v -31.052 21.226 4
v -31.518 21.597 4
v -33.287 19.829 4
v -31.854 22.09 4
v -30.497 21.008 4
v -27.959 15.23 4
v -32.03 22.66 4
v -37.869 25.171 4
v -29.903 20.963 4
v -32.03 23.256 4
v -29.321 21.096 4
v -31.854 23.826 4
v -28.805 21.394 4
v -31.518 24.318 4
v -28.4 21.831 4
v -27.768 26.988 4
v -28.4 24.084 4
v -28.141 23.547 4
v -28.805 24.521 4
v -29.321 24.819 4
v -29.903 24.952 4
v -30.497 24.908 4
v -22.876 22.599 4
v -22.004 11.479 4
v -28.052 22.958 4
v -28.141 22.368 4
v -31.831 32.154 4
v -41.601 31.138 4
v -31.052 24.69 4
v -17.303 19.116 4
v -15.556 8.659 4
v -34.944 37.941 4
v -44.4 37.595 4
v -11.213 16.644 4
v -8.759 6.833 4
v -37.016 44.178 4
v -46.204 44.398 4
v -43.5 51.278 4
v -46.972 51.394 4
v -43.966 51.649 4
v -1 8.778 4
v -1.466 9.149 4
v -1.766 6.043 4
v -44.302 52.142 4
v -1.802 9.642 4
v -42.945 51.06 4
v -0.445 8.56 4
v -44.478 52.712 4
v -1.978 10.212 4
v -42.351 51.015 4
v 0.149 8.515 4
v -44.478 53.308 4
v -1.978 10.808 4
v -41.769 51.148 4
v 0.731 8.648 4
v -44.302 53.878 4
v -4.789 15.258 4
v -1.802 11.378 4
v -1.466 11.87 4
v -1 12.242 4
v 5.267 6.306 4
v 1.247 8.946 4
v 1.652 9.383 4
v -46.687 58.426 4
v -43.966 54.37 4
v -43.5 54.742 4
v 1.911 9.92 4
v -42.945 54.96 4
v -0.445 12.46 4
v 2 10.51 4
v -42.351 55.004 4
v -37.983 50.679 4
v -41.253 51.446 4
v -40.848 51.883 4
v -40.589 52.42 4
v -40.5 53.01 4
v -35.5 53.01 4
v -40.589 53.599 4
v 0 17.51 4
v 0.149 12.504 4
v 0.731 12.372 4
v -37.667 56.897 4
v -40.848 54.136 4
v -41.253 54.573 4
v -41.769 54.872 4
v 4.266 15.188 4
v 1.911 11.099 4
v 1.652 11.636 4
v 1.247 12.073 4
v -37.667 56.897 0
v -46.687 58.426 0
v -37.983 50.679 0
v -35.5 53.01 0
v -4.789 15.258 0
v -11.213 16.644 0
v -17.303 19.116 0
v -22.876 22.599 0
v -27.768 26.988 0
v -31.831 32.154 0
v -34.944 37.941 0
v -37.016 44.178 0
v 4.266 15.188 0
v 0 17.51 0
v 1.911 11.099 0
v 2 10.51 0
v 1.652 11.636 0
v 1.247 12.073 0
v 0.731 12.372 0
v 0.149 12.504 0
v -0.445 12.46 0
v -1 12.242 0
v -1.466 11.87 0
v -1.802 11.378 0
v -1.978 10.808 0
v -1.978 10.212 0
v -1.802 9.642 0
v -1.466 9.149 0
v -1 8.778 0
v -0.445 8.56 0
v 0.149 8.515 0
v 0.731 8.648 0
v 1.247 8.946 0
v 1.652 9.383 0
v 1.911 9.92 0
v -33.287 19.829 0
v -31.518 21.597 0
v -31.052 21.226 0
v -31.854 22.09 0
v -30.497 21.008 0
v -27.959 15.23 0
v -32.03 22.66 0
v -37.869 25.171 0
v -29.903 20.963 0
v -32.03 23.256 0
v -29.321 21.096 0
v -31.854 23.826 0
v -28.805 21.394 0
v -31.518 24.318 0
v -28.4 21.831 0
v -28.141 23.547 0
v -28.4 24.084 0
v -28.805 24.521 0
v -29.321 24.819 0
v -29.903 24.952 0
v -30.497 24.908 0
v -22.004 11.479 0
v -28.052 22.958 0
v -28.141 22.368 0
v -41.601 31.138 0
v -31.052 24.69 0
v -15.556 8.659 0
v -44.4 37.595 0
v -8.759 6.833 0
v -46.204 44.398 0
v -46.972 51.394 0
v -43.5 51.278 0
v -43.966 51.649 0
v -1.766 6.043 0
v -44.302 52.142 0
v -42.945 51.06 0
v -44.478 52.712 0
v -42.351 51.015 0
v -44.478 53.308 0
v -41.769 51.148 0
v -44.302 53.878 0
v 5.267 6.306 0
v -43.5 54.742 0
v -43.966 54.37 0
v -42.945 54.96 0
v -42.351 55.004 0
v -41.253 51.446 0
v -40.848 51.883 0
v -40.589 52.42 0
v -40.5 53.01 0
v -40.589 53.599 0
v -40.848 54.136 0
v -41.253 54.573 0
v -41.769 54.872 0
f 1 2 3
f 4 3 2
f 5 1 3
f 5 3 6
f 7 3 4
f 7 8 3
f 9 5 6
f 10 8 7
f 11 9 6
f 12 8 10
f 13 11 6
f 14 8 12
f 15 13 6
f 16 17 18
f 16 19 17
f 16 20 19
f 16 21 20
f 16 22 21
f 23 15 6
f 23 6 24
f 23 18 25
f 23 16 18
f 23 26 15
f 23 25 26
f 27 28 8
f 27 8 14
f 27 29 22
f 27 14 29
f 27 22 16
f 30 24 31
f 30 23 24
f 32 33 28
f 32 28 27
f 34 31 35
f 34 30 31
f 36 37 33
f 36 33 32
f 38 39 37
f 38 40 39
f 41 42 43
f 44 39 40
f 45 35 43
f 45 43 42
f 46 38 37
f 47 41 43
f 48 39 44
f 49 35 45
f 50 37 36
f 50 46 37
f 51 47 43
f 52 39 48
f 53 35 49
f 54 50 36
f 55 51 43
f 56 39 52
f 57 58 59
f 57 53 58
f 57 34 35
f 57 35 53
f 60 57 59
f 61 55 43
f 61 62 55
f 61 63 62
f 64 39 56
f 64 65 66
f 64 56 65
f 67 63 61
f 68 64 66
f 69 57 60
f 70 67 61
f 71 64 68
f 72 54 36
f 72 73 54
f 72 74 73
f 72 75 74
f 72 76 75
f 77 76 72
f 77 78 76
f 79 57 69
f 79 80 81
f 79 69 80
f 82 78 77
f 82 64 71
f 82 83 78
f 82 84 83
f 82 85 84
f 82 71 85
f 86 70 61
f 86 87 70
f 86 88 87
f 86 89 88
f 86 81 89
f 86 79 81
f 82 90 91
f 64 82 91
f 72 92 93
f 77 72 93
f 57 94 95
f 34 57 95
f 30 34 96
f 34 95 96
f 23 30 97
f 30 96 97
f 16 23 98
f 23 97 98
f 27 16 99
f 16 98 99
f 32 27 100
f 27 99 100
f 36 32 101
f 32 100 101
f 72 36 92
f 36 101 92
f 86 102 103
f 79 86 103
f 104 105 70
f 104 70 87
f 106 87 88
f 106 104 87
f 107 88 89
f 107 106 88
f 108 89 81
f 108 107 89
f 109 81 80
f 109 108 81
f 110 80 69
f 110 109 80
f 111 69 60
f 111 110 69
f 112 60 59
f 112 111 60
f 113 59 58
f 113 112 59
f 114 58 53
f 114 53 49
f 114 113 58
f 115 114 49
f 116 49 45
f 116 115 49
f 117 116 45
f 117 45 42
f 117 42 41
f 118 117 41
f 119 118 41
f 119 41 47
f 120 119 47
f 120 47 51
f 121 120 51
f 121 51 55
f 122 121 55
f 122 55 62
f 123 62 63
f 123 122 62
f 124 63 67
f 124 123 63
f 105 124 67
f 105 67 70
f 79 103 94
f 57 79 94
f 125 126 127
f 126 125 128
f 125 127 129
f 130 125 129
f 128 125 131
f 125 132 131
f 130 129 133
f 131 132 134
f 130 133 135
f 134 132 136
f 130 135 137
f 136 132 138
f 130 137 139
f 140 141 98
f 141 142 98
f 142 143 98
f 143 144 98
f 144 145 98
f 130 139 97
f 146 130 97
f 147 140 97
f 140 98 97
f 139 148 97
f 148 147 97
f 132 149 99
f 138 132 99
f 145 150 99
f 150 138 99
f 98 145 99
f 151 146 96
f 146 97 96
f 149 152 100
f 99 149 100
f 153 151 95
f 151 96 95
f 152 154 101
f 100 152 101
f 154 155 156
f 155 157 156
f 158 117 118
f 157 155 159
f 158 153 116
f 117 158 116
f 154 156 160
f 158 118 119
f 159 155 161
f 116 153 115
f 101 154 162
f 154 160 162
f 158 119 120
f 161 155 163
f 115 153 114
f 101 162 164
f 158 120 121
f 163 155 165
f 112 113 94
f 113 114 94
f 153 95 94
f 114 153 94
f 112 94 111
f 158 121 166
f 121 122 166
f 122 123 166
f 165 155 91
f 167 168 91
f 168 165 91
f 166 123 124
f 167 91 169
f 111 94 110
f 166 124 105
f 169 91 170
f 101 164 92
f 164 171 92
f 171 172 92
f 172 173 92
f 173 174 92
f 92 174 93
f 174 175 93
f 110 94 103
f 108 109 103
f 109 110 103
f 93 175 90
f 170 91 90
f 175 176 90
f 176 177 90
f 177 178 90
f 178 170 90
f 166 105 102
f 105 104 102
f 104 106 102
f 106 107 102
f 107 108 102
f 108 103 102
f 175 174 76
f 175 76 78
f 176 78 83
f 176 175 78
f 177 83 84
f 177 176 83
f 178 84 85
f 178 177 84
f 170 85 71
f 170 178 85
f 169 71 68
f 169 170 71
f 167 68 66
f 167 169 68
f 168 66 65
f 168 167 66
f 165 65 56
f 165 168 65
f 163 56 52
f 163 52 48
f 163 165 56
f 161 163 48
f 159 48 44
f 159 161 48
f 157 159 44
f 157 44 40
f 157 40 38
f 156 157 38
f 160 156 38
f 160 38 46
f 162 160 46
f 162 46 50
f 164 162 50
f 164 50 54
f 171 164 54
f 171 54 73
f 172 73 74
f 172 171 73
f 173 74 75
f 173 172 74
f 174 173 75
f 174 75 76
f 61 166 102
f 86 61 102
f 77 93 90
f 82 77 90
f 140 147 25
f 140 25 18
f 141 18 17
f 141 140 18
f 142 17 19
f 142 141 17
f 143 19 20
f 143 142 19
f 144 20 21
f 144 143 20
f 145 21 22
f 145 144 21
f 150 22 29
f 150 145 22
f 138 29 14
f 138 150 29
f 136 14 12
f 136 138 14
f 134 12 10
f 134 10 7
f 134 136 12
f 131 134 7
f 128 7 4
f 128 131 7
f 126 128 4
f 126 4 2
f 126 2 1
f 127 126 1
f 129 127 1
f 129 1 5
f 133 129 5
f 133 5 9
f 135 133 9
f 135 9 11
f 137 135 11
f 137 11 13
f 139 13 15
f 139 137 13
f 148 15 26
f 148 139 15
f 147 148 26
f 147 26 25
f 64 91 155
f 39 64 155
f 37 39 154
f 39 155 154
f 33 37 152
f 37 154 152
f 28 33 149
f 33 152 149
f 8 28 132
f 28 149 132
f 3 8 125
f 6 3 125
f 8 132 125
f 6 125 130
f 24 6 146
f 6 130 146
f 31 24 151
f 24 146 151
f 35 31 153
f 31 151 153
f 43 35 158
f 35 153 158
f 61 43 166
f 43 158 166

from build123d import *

# Parameters (mm, degrees)
SKETCH_3_R      = 2
EXTRUDE_1_DEPTH = 4


with BuildPart() as part:
    # 草图3 → 凸台-拉伸1 (new body)
    with BuildSketch(Plane.XY):
        with BuildLine():
            Line((-37.667405861, 56.89708202), (-46.686841808, 58.42631375))
            ThreePointArc((-46.686841808, 58.42631375), (-33.287089683, 19.828920451), (5.267276505, 6.30586701))
            Line((5.267276505, 6.30586701), (4.265537779, 15.188089459))
            Line((4.265537779, 15.188089459), (0, 17.509783315))
            Line((0, 17.509783315), (-4.788956139, 15.257523407))
            ThreePointArc((-4.788956139, 15.257523407), (-27.767557087, 26.988061571), (-37.98334573, 50.67897311))
            Line((-37.98334573, 50.67897311), (-35.5, 53.009783315))
            Line((-35.5, 53.009783315), (-37.667405861, 56.89708202))
        make_face()
        with Locations((0, 10.509783315)):
            Circle(SKETCH_3_R, mode=Mode.SUBTRACT)
        with Locations((-30.0520382, 22.957745114)):
            Circle(SKETCH_3_R, mode=Mode.SUBTRACT)
        with Locations((-42.5, 53.009783315)):
            Circle(SKETCH_3_R, mode=Mode.SUBTRACT)
    extrude(amount=EXTRUDE_1_DEPTH)


solid = part.part
